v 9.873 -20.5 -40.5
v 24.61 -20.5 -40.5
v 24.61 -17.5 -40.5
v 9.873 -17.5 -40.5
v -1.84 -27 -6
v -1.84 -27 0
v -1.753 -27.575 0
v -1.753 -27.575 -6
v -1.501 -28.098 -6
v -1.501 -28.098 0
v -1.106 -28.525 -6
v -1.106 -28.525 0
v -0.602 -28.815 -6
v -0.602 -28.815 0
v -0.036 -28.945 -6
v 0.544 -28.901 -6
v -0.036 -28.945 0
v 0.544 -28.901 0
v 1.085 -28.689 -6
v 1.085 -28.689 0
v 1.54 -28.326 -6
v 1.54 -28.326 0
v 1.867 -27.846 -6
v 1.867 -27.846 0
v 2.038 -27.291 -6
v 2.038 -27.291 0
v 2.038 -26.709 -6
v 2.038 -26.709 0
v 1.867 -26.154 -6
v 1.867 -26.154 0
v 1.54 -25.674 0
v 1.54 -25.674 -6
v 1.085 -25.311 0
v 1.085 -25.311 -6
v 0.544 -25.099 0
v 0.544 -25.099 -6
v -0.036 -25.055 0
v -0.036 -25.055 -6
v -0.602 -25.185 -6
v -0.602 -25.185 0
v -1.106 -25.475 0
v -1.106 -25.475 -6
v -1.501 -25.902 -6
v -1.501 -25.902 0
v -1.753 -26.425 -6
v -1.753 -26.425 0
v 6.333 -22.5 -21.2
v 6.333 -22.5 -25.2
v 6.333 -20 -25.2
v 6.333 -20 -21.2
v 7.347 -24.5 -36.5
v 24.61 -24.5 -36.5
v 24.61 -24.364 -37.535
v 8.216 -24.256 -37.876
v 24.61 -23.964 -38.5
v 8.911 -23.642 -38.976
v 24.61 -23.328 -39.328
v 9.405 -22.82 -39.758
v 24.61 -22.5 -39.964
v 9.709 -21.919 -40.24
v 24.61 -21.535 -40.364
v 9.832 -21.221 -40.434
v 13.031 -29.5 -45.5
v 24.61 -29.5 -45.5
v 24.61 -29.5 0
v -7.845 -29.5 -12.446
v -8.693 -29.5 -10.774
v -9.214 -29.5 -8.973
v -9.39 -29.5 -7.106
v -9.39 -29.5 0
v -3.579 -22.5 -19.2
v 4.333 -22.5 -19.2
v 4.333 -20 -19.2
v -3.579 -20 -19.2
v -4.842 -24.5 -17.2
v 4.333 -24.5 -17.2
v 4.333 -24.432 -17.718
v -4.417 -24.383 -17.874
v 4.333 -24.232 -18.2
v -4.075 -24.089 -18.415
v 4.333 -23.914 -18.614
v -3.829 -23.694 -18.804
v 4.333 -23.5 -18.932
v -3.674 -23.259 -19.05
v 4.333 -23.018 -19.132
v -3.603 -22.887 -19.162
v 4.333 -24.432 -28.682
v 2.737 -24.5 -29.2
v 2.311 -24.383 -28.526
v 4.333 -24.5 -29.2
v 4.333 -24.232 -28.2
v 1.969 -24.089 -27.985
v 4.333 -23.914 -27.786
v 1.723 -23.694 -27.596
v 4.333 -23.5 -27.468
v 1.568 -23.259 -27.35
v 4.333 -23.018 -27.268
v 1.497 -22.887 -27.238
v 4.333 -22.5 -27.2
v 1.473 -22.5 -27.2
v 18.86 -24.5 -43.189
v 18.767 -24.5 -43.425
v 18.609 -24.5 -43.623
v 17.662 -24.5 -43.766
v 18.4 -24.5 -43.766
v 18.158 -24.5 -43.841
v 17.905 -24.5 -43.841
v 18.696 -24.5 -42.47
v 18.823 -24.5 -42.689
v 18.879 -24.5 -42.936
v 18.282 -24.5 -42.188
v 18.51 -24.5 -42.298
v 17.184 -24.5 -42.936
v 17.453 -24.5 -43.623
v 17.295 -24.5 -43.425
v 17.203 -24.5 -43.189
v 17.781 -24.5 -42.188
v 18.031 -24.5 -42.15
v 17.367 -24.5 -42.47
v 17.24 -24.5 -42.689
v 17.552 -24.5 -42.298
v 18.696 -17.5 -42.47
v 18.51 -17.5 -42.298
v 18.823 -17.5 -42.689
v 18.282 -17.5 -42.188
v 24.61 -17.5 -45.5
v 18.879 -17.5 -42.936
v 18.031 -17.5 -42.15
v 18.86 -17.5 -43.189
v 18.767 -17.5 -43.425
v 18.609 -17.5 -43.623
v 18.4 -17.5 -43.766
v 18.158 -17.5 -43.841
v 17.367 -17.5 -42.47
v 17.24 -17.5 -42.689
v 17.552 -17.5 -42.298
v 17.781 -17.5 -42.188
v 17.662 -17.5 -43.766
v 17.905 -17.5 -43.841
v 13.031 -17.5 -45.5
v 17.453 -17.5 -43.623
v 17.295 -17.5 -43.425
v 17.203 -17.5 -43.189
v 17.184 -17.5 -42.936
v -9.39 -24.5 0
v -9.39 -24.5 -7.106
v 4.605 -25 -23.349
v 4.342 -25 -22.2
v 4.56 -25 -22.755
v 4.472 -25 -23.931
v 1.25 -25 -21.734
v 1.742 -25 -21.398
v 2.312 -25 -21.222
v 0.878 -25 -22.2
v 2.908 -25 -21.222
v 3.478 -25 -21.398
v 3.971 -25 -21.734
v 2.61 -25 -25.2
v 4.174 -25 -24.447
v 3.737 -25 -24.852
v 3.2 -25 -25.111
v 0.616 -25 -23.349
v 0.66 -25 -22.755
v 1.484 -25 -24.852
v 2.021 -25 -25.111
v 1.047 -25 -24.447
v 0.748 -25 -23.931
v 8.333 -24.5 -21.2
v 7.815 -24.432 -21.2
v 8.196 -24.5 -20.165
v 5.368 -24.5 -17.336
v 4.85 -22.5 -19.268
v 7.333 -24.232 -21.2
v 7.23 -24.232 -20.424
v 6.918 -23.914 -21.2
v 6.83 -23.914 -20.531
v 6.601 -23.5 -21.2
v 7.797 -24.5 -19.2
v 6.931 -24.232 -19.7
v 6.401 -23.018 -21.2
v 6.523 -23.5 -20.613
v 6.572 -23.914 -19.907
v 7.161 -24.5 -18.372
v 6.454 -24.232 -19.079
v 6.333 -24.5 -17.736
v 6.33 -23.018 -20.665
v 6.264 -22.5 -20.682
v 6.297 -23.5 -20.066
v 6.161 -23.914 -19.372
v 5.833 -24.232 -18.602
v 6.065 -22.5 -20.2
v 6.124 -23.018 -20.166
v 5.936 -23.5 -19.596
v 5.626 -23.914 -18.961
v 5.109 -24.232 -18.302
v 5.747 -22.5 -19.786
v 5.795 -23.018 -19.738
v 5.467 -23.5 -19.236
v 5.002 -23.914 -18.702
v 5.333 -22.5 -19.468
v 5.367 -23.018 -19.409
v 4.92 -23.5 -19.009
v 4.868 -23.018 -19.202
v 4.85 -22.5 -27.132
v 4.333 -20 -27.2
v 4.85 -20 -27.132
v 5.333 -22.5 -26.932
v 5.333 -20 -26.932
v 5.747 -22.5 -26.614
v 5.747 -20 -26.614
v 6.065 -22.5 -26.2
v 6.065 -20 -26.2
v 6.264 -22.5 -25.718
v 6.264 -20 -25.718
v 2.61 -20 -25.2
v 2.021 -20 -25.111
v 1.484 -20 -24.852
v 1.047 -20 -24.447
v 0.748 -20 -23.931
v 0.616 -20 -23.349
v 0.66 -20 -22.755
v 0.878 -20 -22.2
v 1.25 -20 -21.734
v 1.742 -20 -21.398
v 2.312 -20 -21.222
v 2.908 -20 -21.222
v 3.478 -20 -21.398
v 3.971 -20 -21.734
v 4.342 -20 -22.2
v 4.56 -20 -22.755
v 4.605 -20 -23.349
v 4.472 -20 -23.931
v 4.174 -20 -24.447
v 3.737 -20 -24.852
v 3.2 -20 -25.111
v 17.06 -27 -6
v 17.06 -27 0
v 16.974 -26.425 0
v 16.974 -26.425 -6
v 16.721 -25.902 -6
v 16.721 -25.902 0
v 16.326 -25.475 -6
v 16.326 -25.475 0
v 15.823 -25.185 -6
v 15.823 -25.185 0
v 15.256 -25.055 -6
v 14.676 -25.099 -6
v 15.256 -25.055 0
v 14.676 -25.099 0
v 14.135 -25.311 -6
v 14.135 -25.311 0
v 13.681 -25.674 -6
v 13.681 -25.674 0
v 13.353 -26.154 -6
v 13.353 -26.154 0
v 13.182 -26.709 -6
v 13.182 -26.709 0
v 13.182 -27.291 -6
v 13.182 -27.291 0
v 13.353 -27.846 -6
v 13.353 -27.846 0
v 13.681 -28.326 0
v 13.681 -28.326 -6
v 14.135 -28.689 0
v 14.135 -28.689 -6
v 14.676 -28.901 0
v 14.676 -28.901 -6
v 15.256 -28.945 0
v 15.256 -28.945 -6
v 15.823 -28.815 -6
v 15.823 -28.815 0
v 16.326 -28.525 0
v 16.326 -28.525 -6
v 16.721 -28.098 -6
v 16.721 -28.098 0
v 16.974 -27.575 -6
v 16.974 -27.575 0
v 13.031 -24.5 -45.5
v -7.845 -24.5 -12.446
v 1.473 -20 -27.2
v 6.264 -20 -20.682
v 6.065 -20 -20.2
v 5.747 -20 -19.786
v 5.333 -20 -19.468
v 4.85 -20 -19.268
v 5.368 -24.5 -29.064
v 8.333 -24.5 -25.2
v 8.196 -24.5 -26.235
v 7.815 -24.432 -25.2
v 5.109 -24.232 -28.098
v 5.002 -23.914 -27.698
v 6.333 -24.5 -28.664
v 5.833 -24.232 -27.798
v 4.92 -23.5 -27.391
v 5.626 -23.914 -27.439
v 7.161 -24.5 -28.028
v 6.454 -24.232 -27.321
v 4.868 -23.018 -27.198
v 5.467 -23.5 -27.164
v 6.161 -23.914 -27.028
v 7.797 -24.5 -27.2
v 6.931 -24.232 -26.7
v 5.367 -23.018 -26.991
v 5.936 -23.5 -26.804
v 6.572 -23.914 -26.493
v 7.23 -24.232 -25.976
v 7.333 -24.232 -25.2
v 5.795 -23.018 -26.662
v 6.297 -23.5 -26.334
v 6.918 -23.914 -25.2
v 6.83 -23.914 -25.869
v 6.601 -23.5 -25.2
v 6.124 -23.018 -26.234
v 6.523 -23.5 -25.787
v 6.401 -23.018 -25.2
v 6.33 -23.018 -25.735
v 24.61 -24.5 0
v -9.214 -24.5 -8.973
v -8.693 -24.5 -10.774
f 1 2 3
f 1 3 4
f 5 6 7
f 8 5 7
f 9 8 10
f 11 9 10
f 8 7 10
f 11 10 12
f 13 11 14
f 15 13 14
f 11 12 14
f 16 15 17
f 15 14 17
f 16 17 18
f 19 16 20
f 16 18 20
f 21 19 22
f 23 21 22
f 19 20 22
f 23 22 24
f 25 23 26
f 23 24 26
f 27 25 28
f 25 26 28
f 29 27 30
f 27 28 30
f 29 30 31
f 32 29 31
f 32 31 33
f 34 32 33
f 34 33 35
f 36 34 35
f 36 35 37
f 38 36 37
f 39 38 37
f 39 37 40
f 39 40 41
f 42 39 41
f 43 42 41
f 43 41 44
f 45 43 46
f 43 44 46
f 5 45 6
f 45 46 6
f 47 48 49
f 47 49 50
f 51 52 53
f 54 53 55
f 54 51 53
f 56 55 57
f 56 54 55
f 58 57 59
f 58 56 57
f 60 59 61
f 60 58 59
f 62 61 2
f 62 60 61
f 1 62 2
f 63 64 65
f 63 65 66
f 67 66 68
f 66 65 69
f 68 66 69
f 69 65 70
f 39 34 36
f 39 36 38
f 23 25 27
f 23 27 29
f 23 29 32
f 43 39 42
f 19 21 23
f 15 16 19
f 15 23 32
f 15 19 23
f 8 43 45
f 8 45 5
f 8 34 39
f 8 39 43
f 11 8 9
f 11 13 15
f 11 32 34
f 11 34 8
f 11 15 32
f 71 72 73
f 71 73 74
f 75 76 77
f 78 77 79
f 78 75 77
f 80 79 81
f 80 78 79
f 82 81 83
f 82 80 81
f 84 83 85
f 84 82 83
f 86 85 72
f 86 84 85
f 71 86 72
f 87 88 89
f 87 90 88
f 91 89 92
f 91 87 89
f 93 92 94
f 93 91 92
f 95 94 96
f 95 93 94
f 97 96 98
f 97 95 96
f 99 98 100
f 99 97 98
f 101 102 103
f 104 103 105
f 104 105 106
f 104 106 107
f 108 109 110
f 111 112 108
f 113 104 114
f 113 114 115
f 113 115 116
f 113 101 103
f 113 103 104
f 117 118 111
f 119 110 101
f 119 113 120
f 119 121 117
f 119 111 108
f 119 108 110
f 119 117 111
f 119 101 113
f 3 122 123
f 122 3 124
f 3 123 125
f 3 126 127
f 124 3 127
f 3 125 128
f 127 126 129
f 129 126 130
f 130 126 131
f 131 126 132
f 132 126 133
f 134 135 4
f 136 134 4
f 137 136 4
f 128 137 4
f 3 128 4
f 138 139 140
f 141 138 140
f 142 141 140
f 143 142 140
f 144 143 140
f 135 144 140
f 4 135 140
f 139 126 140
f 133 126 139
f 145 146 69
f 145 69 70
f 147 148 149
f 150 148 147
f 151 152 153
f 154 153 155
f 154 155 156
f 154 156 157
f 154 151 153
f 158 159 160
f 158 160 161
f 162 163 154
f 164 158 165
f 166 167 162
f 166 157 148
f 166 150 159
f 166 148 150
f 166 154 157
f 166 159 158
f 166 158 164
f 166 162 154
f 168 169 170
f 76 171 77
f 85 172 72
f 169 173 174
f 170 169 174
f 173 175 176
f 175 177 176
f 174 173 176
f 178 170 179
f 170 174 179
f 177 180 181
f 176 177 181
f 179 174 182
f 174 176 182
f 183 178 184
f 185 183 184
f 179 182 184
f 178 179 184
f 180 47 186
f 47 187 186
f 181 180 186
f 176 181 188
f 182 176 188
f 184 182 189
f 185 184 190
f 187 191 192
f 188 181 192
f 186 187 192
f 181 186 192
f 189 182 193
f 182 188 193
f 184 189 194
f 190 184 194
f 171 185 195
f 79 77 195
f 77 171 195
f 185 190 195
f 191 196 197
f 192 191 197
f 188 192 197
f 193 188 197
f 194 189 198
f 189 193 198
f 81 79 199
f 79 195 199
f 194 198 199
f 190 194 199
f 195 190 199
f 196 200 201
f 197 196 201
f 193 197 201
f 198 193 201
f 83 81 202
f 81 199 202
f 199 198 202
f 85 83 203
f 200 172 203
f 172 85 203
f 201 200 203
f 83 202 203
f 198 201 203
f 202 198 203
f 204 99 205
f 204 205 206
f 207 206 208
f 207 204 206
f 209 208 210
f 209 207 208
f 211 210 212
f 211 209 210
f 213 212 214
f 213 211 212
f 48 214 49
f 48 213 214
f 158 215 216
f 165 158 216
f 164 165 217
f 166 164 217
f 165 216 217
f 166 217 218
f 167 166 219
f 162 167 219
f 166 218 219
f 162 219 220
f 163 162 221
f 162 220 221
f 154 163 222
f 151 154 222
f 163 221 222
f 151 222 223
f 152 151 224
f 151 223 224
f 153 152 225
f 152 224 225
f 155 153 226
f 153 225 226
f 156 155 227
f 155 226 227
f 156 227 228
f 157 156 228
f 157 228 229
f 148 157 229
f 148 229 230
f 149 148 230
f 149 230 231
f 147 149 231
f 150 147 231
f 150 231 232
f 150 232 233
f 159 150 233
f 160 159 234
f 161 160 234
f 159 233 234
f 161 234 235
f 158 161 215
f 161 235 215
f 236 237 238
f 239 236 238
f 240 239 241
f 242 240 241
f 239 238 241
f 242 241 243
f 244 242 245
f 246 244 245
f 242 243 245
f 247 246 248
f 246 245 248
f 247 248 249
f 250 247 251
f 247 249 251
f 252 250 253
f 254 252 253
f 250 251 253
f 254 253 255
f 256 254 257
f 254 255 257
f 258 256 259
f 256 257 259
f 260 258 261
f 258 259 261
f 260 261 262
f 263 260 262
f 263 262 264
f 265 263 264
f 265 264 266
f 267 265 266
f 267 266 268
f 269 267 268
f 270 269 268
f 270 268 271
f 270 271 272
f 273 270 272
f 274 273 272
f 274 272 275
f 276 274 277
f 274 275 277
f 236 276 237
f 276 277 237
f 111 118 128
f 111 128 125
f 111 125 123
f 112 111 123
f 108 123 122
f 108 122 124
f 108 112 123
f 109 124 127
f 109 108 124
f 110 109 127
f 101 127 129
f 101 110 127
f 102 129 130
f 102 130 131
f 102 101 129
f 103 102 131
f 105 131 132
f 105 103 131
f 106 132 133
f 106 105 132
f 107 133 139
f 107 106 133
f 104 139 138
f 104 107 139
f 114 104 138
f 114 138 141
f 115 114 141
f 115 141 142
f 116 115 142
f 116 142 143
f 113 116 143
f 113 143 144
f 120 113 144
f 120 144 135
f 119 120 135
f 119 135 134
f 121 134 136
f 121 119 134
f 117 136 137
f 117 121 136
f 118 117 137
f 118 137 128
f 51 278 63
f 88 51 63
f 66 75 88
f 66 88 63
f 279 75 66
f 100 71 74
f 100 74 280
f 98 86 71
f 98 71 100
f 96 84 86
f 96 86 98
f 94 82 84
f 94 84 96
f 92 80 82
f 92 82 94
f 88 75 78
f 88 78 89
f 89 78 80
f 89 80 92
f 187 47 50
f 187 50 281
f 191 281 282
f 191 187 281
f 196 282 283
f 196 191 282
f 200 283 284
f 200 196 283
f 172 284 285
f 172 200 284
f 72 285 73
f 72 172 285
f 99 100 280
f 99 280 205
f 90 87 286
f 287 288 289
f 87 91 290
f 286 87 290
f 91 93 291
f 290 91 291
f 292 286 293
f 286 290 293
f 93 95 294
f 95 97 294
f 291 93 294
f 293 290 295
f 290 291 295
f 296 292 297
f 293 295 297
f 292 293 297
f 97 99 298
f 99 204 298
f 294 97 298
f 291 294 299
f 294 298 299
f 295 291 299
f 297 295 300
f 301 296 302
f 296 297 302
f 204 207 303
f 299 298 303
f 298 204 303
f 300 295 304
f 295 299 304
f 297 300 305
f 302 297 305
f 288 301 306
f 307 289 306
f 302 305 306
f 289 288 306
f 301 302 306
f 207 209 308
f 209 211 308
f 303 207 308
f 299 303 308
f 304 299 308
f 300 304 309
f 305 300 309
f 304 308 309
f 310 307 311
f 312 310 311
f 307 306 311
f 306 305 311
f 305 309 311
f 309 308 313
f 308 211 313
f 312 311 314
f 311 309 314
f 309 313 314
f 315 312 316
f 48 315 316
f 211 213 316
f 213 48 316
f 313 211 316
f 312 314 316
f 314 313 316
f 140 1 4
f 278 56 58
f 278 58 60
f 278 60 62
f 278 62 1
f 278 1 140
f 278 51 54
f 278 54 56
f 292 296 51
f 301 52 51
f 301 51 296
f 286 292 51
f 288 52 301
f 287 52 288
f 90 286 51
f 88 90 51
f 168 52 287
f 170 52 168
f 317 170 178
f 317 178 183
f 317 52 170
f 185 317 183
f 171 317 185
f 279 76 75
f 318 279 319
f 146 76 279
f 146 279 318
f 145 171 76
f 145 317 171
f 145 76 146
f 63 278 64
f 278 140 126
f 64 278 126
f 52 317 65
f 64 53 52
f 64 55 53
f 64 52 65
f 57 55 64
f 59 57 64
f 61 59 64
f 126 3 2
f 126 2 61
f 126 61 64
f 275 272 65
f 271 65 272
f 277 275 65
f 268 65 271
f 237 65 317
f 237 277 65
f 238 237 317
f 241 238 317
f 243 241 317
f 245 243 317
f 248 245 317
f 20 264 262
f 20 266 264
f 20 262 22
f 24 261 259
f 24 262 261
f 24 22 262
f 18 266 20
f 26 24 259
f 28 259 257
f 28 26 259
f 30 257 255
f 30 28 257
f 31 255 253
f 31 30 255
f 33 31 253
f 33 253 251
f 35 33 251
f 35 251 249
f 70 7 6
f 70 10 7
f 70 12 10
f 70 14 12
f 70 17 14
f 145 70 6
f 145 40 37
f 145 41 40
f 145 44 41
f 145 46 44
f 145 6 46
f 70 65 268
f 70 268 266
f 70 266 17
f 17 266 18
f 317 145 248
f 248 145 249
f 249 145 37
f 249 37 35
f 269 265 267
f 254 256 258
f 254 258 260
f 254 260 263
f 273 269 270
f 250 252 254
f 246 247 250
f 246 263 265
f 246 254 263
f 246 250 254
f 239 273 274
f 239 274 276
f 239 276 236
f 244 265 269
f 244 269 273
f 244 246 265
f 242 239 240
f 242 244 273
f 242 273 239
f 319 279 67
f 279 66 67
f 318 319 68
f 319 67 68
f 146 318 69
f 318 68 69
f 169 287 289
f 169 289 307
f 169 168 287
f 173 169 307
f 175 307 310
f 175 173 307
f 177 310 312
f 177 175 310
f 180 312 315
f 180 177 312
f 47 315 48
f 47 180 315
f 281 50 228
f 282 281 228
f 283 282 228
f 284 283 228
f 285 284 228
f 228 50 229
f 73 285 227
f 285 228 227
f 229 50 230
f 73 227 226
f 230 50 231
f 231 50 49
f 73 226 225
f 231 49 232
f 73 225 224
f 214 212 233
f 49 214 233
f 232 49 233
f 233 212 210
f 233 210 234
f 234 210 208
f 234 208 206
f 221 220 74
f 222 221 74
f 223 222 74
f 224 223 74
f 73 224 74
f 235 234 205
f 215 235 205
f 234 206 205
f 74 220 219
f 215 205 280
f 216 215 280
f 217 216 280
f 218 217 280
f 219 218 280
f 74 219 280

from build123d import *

# Parameters (mm, degrees)
SKETCH1_W           = 34
SKETCH1_H           = 29
SKETCH1_R           = 1.4
SKETCH1_R_2         = 1.5
BOSS_EXTRUDE1_DEPTH = 5
BOSS_EXTRUDE2_DEPTH = 5
SKETCH3_R           = 0.85
BOSS_EXTRUDE3_DEPTH = 7
CUT_EXTRUDE2_DEPTH  = 5
FILLET1_R           = 4
SKETCH7_W           = 5
SKETCH7_H           = 34
CUT_EXTRUDE3_DEPTH  = 44
SKETCH8_R           = 1.95
CUT_EXTRUDE4_DEPTH  = 6
FILLET2_R           = 10
BOSS_EXTRUDE4_DEPTH = 4.5
CUT_EXTRUDE5_START  = 4.5
SKETCH9_R           = 2
CUT_EXTRUDE5_DEPTH  = 5
FILLET3_R           = 2


with BuildPart() as part:
    # Sketch1 → Boss-Extrude1 (new body)
    with BuildSketch(Plane.XY):
        with Locations((7.610207842, -10)):
            Rectangle(SKETCH1_W, SKETCH1_H)
        with Locations((15.010207842, 0)):
            Circle(SKETCH1_R, mode=Mode.SUBTRACT)
        with Locations((15.010207842, -20)):
            Circle(SKETCH1_R, mode=Mode.SUBTRACT)
        with Locations((0.010207842, 0)):
            Circle(SKETCH1_R_2, mode=Mode.SUBTRACT)
        with Locations((0.010207842, -20)):
            Circle(SKETCH1_R_2, mode=Mode.SUBTRACT)
    extrude(amount=BOSS_EXTRUDE1_DEPTH)

    # Sketch2 → Boss-Extrude2 (add)
    with BuildSketch(Plane.XZ.offset(24.5)):
        Polygon((-9.389792158, -10), (-9.389792158, 5), (24.610207842, 5), (24.610207842, -48), (14.610207842, -48), align=None)
    extrude(amount=BOSS_EXTRUDE2_DEPTH)

    # Sketch3 → Boss-Extrude3 (add)
    with BuildSketch(Plane(origin=(0, -24.5, 0), x_dir=(1, 0, 0), z_dir=(0, 1, 0))):
        Polygon((24.610207842, 40.5), (9.873365737, 40.5), (13.031260474, 45.5), (24.610207842, 45.5), align=None)
        with Locations(Location((18.031260474, 43, 0), (0, 0, 270))):  # turned: the seam where the file's is
            Circle(SKETCH3_R, mode=Mode.SUBTRACT)
    extrude(amount=BOSS_EXTRUDE3_DEPTH)

    # Sketch6 → Cut-Extrude2 (cut)
    with BuildSketch(Plane(origin=(0, -24.5, 0), x_dir=(1, 0, 0), z_dir=(0, 1, 0))):
        Polygon((13.031260474, 45.5), (24.610207842, 45.5), (24.610207842, 48), (14.610207842, 48), align=None)
    extrude(amount=-CUT_EXTRUDE2_DEPTH, mode=Mode.SUBTRACT)

    # Fillet1
    fillet1_edges = [part.edges().sort_by_distance(p)[0] for p in [
        (17.24178679, -24.5, -40.5),
    ]]
    fillet(fillet1_edges, radius=FILLET1_R)

    # Sketch7 → Cut-Extrude3 (cut)
    with BuildSketch(Plane.ZY.offset(9.389792158)):
        with Locations((2.5, -12.5)):
            Rectangle(SKETCH7_W, SKETCH7_H)
    extrude(amount=-CUT_EXTRUDE3_DEPTH, mode=Mode.SUBTRACT)

    # Sketch8 → Cut-Extrude4 (cut)
    with BuildSketch(Plane.XY):
        with Locations((15.110207842, -27)):
            Circle(SKETCH8_R)
        with Locations(Location((0.110207842, -27, 0), (0, 0, 180))):  # turned: the seam where the file's is
            Circle(SKETCH8_R)
    extrude(amount=-CUT_EXTRUDE4_DEPTH, mode=Mode.SUBTRACT)

    # Fillet2
    fillet2_edges = [part.edges().sort_by_distance(p)[0] for p in [
        (-9.389792158, -27, -10),
    ]]
    fillet(fillet2_edges, radius=FILLET2_R)

    # Sketch11 → Boss-Extrude4 (add)
    with BuildSketch(Plane(origin=(0, -24.5, 0), x_dir=(1, 0, 0), z_dir=(0, 1, 0))):
        with BuildLine():
            Line((1.473365737, 27.2), (4.332633033, 27.2))
            ThreePointArc((4.332633033, 27.2), (5.746846596, 26.614213562), (6.332633033, 25.2))
            Line((6.332633033, 25.2), (6.332633033, 21.2))
            ThreePointArc((6.332633033, 21.2), (5.746846596, 19.785786438), (4.332633033, 19.2))
            Line((4.332633033, 19.2), (-3.579265842, 19.2))
            Line((-3.579265842, 19.2), (1.473365737, 27.2))
        make_face()
    extrude(amount=BOSS_EXTRUDE4_DEPTH)

    # Sketch9 → Cut-Extrude5 (cut)
    with BuildSketch(Plane(origin=(0, -24.5, 0), x_dir=(1, 0, 0), z_dir=(0, 1, 0)).offset(CUT_EXTRUDE5_START)):
        with Locations(Location((2.610207842, 23.2, 0), (0, 0, 90))):  # turned: the seam where the file's is
            Circle(SKETCH9_R)
    extrude(amount=-CUT_EXTRUDE5_DEPTH, mode=Mode.SUBTRACT)

    # Fillet3
    fillet3_edges = [part.edges().sort_by_distance(p)[0] for p in [
        (0.376683596, -24.5, -19.2),
        (5.746846596, -24.5, -19.785786438),
        (6.332633033, -24.5, -23.2),
        (5.746846596, -24.5, -26.614213562),
        (2.902999385, -24.5, -27.2),
    ]]
    fillet(fillet3_edges, radius=FILLET3_R)


solid = part.part
